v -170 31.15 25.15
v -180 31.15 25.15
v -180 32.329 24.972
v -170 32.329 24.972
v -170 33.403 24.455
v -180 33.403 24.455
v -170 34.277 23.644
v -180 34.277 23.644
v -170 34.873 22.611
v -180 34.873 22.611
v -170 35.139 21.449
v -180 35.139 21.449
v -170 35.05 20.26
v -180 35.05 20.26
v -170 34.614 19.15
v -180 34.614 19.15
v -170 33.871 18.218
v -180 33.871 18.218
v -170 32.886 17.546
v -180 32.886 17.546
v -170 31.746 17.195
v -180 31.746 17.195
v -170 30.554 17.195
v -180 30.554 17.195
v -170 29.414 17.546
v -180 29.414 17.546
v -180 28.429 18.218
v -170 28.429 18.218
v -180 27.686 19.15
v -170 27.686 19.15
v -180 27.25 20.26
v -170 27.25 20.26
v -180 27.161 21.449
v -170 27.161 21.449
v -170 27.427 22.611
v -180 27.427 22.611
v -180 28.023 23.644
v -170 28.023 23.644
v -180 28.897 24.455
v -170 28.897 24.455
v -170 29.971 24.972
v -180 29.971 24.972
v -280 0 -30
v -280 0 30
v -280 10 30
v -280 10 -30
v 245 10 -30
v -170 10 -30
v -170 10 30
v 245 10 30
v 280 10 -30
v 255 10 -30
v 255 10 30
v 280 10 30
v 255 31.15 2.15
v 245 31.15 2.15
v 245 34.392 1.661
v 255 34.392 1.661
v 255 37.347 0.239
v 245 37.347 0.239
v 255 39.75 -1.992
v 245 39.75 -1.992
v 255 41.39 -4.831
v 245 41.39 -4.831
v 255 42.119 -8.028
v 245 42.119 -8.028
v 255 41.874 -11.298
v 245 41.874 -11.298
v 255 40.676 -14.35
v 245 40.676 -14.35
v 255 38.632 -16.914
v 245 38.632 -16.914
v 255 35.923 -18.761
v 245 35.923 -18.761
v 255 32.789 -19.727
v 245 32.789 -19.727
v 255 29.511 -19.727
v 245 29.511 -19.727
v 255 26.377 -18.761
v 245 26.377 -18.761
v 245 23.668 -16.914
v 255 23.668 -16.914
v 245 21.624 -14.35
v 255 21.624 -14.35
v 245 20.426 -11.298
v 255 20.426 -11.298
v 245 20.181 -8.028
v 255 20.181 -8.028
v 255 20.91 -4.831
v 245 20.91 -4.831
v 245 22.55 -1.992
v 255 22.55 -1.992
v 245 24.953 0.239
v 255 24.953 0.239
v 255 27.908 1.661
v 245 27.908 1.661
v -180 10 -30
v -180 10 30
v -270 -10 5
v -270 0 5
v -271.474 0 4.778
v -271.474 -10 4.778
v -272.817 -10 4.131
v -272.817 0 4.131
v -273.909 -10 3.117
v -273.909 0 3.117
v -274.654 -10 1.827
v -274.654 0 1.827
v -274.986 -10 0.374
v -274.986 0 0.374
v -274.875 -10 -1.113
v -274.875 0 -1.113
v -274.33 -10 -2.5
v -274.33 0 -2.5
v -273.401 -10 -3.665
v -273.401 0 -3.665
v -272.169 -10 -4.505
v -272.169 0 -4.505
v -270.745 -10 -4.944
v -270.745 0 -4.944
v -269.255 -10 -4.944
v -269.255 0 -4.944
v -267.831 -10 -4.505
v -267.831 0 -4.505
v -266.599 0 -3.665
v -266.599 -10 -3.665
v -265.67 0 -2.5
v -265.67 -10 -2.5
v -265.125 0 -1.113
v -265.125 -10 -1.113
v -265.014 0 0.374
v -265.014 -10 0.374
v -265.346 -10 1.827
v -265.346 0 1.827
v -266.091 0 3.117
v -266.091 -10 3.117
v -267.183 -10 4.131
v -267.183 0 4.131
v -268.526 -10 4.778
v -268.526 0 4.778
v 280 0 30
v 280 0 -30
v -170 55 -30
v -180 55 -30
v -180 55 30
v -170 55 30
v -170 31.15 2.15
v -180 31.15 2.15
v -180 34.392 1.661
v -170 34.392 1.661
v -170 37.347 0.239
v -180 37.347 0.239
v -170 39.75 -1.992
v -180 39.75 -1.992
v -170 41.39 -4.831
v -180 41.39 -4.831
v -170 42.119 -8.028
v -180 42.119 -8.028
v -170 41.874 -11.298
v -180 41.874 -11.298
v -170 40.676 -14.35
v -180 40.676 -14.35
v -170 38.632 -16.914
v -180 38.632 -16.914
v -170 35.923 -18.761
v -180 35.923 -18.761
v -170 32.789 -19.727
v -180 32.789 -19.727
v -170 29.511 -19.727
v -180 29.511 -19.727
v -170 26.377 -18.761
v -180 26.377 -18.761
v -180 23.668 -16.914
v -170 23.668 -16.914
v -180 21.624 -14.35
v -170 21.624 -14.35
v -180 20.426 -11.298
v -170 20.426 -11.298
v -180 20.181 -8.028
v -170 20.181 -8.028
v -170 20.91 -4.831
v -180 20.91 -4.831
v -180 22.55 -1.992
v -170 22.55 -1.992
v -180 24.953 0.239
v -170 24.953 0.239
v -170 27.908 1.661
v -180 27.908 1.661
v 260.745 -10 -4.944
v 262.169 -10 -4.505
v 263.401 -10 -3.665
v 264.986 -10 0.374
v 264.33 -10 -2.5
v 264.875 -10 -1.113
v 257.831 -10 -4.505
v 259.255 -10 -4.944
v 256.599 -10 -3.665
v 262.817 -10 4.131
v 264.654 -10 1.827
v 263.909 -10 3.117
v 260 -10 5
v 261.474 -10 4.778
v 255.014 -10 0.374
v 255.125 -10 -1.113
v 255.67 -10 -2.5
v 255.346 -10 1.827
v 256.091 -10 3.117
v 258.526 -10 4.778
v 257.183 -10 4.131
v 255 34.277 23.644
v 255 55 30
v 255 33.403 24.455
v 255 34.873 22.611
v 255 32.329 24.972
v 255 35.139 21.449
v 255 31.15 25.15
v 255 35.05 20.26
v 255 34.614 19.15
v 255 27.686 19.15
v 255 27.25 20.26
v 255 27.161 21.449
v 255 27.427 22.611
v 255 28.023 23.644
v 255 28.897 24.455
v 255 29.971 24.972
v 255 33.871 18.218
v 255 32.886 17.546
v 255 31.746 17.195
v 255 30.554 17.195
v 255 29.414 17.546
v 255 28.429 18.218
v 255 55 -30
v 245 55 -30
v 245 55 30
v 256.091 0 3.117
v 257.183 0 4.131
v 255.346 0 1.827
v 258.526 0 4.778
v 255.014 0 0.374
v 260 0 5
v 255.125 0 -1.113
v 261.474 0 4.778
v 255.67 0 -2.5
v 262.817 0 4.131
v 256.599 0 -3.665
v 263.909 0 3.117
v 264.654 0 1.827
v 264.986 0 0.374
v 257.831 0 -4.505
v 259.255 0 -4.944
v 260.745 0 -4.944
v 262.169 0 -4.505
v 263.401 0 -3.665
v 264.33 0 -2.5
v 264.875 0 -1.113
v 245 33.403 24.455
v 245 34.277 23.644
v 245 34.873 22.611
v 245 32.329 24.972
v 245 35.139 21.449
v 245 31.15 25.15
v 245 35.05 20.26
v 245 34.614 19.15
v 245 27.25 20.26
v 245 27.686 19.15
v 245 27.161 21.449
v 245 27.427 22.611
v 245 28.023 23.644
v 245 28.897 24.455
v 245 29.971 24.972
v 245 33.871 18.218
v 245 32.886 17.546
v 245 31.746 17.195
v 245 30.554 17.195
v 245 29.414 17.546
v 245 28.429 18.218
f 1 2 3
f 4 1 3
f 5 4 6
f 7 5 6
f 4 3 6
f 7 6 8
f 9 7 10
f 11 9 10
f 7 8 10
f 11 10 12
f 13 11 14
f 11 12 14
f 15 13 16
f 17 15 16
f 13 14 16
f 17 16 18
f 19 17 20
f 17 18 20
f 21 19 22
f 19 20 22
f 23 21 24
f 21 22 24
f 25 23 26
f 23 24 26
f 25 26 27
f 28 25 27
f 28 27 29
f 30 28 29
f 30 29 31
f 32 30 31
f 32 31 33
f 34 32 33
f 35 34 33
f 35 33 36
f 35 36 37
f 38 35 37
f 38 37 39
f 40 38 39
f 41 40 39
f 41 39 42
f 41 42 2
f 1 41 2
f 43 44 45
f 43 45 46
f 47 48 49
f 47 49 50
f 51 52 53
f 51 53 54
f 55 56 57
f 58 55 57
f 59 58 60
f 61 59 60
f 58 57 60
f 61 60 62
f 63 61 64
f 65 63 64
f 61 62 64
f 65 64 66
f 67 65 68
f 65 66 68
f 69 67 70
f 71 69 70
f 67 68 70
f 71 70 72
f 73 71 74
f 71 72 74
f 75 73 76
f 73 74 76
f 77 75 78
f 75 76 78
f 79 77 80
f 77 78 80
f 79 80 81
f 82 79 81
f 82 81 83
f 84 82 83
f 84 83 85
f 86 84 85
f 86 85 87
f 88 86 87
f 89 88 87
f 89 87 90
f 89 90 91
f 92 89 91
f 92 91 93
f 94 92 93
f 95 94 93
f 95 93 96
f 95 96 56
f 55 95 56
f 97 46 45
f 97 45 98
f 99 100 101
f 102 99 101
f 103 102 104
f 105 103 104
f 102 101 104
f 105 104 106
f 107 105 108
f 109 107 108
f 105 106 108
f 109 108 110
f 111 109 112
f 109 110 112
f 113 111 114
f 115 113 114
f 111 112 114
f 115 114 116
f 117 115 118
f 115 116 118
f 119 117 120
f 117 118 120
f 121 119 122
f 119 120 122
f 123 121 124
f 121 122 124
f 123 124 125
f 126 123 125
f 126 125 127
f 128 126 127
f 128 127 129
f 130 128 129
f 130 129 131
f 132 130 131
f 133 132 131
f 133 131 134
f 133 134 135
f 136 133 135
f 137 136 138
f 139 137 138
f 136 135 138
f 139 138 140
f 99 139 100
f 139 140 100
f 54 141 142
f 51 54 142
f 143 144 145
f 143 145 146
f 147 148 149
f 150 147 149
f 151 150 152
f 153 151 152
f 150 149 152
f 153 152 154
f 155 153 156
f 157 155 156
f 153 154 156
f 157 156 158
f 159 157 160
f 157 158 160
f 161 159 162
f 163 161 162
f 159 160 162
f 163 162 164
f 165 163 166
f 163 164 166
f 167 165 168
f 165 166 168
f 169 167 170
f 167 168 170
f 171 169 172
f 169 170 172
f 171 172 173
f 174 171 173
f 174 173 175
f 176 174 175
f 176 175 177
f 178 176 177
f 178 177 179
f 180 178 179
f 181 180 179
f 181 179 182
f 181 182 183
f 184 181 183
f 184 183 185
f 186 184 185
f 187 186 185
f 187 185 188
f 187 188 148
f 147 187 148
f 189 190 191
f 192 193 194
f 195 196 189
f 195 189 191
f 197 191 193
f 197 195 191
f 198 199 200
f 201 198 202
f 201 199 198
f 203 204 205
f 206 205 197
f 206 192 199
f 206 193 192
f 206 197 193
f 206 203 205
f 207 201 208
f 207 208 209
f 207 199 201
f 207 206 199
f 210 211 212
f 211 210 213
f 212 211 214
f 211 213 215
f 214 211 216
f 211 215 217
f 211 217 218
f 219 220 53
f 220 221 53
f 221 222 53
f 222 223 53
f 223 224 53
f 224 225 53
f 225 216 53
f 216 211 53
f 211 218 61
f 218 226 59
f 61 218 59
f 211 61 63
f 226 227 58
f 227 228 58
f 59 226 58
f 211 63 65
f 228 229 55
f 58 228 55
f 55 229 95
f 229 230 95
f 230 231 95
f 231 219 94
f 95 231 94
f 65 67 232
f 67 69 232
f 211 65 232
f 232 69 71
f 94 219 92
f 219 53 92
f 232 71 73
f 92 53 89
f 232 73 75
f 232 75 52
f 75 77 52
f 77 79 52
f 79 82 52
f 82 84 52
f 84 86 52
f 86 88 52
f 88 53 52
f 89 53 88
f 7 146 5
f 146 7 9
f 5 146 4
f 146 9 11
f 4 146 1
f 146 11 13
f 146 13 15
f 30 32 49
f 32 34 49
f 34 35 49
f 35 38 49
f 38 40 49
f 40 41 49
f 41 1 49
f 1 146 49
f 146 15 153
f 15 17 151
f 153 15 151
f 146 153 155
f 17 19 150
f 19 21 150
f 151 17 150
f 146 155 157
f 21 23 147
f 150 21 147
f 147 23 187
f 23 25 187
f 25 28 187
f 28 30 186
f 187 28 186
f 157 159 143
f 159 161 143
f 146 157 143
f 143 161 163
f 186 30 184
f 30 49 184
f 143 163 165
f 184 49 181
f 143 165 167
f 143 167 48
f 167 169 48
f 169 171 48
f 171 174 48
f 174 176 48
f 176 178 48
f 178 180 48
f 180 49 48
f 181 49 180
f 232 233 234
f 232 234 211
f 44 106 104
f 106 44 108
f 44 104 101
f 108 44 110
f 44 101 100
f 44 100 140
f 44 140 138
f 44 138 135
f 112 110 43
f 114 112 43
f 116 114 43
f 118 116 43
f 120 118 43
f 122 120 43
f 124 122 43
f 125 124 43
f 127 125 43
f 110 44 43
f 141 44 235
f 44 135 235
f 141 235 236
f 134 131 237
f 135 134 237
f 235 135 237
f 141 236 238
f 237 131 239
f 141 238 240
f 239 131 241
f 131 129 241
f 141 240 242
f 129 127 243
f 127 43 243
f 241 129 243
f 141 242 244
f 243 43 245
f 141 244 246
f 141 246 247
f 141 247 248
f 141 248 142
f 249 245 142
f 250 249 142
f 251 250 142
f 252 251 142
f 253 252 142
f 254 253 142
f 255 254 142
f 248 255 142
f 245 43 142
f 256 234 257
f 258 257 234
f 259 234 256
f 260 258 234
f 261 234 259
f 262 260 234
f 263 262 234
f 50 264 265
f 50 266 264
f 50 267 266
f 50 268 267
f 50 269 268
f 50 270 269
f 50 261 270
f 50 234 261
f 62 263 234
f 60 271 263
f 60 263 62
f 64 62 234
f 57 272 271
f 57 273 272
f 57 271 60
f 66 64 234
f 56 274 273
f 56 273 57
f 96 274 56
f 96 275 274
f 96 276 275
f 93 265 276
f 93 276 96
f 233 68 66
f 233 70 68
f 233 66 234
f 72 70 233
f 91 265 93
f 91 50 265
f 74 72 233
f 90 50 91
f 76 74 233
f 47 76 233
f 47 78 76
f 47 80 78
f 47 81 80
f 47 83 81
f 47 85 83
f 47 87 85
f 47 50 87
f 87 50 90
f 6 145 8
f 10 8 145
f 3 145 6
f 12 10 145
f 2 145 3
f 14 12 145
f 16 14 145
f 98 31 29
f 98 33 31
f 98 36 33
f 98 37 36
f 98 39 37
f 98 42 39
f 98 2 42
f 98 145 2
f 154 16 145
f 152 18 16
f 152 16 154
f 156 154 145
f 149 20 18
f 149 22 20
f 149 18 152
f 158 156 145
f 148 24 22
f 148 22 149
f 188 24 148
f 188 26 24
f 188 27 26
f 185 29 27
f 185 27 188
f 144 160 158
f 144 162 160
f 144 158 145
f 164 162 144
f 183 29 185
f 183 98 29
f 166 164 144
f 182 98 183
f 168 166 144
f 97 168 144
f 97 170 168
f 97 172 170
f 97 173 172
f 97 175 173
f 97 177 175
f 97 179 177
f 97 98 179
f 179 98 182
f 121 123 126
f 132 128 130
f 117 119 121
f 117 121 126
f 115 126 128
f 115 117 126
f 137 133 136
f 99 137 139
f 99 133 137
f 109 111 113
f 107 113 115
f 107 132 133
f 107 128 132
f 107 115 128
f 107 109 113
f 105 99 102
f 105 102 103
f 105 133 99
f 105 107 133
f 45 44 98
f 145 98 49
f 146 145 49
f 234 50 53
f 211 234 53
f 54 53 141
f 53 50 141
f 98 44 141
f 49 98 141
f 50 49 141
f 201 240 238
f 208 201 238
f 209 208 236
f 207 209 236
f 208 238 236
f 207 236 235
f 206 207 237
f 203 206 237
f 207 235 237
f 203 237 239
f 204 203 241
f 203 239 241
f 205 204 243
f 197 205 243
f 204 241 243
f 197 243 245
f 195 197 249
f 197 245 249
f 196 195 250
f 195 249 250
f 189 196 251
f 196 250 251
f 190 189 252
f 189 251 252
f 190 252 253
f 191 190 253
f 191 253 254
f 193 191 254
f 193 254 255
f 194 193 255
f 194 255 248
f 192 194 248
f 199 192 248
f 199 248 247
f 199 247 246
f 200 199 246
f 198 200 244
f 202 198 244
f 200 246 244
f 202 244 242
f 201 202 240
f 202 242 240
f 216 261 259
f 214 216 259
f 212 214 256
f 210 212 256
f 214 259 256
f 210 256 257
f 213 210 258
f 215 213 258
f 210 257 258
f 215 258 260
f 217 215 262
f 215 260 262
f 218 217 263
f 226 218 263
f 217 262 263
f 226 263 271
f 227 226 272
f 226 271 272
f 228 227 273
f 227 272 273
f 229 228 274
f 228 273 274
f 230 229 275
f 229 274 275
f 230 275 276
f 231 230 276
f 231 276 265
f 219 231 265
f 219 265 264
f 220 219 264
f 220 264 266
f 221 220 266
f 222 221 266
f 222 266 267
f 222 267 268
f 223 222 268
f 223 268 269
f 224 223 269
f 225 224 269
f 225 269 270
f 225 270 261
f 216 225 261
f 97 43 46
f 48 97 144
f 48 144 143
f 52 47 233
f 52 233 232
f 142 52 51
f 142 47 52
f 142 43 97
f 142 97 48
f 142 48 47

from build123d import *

# Parameters (mm, degrees)
SKETCH1_W           = 560
SKETCH1_H           = 60
BOSS_EXTRUDE1_DEPTH = 10
SKETCH2_W           = 10
SKETCH2_H           = 60
BOSS_EXTRUDE2_DEPTH = 45
SKETCH3_R           = 11
SKETCH3_R_2         = 4
CUT_EXTRUDE1_DEPTH  = 440
SKETCH4_R           = 5
BOSS_EXTRUDE3_DEPTH = 10


with BuildPart() as part:
    # Sketch1 → Boss-Extrude1 (new body)
    with BuildSketch(Plane(origin=(0, 0, 0), x_dir=(1, 0, 0), z_dir=(0, 1, 0))):
        Rectangle(SKETCH1_W, SKETCH1_H)
    extrude(amount=BOSS_EXTRUDE1_DEPTH)

    # Sketch2 → Boss-Extrude2 (add)
    with BuildSketch(Plane(origin=(0, 10, 0), x_dir=(1, 0, 0), z_dir=(0, 1, 0))):
        with Locations((-175, 0)):
            Rectangle(SKETCH2_W, SKETCH2_H)
        with Locations((250, 0)):
            Rectangle(SKETCH2_W, SKETCH2_H)
    extrude(amount=BOSS_EXTRUDE2_DEPTH)

    # Sketch3 → Cut-Extrude1 (cut)
    with BuildSketch(Plane.ZY.offset(180)):
        with Locations((-8.85, 31.15)):
            Circle(SKETCH3_R)
        with Locations((21.15, 31.15)):
            Circle(SKETCH3_R_2)
    extrude(amount=-CUT_EXTRUDE1_DEPTH, mode=Mode.SUBTRACT)

    # Sketch4 → Boss-Extrude3 (add)
    with BuildSketch(Plane.XZ):
        with Locations(Location((-270, 0, 0), (0, 0, 90))):
            Circle(SKETCH4_R)
        with Locations(Location((260, 0, 0), (0, 0, 90))):
            Circle(SKETCH4_R)
    extrude(amount=BOSS_EXTRUDE3_DEPTH)


solid = part.part
